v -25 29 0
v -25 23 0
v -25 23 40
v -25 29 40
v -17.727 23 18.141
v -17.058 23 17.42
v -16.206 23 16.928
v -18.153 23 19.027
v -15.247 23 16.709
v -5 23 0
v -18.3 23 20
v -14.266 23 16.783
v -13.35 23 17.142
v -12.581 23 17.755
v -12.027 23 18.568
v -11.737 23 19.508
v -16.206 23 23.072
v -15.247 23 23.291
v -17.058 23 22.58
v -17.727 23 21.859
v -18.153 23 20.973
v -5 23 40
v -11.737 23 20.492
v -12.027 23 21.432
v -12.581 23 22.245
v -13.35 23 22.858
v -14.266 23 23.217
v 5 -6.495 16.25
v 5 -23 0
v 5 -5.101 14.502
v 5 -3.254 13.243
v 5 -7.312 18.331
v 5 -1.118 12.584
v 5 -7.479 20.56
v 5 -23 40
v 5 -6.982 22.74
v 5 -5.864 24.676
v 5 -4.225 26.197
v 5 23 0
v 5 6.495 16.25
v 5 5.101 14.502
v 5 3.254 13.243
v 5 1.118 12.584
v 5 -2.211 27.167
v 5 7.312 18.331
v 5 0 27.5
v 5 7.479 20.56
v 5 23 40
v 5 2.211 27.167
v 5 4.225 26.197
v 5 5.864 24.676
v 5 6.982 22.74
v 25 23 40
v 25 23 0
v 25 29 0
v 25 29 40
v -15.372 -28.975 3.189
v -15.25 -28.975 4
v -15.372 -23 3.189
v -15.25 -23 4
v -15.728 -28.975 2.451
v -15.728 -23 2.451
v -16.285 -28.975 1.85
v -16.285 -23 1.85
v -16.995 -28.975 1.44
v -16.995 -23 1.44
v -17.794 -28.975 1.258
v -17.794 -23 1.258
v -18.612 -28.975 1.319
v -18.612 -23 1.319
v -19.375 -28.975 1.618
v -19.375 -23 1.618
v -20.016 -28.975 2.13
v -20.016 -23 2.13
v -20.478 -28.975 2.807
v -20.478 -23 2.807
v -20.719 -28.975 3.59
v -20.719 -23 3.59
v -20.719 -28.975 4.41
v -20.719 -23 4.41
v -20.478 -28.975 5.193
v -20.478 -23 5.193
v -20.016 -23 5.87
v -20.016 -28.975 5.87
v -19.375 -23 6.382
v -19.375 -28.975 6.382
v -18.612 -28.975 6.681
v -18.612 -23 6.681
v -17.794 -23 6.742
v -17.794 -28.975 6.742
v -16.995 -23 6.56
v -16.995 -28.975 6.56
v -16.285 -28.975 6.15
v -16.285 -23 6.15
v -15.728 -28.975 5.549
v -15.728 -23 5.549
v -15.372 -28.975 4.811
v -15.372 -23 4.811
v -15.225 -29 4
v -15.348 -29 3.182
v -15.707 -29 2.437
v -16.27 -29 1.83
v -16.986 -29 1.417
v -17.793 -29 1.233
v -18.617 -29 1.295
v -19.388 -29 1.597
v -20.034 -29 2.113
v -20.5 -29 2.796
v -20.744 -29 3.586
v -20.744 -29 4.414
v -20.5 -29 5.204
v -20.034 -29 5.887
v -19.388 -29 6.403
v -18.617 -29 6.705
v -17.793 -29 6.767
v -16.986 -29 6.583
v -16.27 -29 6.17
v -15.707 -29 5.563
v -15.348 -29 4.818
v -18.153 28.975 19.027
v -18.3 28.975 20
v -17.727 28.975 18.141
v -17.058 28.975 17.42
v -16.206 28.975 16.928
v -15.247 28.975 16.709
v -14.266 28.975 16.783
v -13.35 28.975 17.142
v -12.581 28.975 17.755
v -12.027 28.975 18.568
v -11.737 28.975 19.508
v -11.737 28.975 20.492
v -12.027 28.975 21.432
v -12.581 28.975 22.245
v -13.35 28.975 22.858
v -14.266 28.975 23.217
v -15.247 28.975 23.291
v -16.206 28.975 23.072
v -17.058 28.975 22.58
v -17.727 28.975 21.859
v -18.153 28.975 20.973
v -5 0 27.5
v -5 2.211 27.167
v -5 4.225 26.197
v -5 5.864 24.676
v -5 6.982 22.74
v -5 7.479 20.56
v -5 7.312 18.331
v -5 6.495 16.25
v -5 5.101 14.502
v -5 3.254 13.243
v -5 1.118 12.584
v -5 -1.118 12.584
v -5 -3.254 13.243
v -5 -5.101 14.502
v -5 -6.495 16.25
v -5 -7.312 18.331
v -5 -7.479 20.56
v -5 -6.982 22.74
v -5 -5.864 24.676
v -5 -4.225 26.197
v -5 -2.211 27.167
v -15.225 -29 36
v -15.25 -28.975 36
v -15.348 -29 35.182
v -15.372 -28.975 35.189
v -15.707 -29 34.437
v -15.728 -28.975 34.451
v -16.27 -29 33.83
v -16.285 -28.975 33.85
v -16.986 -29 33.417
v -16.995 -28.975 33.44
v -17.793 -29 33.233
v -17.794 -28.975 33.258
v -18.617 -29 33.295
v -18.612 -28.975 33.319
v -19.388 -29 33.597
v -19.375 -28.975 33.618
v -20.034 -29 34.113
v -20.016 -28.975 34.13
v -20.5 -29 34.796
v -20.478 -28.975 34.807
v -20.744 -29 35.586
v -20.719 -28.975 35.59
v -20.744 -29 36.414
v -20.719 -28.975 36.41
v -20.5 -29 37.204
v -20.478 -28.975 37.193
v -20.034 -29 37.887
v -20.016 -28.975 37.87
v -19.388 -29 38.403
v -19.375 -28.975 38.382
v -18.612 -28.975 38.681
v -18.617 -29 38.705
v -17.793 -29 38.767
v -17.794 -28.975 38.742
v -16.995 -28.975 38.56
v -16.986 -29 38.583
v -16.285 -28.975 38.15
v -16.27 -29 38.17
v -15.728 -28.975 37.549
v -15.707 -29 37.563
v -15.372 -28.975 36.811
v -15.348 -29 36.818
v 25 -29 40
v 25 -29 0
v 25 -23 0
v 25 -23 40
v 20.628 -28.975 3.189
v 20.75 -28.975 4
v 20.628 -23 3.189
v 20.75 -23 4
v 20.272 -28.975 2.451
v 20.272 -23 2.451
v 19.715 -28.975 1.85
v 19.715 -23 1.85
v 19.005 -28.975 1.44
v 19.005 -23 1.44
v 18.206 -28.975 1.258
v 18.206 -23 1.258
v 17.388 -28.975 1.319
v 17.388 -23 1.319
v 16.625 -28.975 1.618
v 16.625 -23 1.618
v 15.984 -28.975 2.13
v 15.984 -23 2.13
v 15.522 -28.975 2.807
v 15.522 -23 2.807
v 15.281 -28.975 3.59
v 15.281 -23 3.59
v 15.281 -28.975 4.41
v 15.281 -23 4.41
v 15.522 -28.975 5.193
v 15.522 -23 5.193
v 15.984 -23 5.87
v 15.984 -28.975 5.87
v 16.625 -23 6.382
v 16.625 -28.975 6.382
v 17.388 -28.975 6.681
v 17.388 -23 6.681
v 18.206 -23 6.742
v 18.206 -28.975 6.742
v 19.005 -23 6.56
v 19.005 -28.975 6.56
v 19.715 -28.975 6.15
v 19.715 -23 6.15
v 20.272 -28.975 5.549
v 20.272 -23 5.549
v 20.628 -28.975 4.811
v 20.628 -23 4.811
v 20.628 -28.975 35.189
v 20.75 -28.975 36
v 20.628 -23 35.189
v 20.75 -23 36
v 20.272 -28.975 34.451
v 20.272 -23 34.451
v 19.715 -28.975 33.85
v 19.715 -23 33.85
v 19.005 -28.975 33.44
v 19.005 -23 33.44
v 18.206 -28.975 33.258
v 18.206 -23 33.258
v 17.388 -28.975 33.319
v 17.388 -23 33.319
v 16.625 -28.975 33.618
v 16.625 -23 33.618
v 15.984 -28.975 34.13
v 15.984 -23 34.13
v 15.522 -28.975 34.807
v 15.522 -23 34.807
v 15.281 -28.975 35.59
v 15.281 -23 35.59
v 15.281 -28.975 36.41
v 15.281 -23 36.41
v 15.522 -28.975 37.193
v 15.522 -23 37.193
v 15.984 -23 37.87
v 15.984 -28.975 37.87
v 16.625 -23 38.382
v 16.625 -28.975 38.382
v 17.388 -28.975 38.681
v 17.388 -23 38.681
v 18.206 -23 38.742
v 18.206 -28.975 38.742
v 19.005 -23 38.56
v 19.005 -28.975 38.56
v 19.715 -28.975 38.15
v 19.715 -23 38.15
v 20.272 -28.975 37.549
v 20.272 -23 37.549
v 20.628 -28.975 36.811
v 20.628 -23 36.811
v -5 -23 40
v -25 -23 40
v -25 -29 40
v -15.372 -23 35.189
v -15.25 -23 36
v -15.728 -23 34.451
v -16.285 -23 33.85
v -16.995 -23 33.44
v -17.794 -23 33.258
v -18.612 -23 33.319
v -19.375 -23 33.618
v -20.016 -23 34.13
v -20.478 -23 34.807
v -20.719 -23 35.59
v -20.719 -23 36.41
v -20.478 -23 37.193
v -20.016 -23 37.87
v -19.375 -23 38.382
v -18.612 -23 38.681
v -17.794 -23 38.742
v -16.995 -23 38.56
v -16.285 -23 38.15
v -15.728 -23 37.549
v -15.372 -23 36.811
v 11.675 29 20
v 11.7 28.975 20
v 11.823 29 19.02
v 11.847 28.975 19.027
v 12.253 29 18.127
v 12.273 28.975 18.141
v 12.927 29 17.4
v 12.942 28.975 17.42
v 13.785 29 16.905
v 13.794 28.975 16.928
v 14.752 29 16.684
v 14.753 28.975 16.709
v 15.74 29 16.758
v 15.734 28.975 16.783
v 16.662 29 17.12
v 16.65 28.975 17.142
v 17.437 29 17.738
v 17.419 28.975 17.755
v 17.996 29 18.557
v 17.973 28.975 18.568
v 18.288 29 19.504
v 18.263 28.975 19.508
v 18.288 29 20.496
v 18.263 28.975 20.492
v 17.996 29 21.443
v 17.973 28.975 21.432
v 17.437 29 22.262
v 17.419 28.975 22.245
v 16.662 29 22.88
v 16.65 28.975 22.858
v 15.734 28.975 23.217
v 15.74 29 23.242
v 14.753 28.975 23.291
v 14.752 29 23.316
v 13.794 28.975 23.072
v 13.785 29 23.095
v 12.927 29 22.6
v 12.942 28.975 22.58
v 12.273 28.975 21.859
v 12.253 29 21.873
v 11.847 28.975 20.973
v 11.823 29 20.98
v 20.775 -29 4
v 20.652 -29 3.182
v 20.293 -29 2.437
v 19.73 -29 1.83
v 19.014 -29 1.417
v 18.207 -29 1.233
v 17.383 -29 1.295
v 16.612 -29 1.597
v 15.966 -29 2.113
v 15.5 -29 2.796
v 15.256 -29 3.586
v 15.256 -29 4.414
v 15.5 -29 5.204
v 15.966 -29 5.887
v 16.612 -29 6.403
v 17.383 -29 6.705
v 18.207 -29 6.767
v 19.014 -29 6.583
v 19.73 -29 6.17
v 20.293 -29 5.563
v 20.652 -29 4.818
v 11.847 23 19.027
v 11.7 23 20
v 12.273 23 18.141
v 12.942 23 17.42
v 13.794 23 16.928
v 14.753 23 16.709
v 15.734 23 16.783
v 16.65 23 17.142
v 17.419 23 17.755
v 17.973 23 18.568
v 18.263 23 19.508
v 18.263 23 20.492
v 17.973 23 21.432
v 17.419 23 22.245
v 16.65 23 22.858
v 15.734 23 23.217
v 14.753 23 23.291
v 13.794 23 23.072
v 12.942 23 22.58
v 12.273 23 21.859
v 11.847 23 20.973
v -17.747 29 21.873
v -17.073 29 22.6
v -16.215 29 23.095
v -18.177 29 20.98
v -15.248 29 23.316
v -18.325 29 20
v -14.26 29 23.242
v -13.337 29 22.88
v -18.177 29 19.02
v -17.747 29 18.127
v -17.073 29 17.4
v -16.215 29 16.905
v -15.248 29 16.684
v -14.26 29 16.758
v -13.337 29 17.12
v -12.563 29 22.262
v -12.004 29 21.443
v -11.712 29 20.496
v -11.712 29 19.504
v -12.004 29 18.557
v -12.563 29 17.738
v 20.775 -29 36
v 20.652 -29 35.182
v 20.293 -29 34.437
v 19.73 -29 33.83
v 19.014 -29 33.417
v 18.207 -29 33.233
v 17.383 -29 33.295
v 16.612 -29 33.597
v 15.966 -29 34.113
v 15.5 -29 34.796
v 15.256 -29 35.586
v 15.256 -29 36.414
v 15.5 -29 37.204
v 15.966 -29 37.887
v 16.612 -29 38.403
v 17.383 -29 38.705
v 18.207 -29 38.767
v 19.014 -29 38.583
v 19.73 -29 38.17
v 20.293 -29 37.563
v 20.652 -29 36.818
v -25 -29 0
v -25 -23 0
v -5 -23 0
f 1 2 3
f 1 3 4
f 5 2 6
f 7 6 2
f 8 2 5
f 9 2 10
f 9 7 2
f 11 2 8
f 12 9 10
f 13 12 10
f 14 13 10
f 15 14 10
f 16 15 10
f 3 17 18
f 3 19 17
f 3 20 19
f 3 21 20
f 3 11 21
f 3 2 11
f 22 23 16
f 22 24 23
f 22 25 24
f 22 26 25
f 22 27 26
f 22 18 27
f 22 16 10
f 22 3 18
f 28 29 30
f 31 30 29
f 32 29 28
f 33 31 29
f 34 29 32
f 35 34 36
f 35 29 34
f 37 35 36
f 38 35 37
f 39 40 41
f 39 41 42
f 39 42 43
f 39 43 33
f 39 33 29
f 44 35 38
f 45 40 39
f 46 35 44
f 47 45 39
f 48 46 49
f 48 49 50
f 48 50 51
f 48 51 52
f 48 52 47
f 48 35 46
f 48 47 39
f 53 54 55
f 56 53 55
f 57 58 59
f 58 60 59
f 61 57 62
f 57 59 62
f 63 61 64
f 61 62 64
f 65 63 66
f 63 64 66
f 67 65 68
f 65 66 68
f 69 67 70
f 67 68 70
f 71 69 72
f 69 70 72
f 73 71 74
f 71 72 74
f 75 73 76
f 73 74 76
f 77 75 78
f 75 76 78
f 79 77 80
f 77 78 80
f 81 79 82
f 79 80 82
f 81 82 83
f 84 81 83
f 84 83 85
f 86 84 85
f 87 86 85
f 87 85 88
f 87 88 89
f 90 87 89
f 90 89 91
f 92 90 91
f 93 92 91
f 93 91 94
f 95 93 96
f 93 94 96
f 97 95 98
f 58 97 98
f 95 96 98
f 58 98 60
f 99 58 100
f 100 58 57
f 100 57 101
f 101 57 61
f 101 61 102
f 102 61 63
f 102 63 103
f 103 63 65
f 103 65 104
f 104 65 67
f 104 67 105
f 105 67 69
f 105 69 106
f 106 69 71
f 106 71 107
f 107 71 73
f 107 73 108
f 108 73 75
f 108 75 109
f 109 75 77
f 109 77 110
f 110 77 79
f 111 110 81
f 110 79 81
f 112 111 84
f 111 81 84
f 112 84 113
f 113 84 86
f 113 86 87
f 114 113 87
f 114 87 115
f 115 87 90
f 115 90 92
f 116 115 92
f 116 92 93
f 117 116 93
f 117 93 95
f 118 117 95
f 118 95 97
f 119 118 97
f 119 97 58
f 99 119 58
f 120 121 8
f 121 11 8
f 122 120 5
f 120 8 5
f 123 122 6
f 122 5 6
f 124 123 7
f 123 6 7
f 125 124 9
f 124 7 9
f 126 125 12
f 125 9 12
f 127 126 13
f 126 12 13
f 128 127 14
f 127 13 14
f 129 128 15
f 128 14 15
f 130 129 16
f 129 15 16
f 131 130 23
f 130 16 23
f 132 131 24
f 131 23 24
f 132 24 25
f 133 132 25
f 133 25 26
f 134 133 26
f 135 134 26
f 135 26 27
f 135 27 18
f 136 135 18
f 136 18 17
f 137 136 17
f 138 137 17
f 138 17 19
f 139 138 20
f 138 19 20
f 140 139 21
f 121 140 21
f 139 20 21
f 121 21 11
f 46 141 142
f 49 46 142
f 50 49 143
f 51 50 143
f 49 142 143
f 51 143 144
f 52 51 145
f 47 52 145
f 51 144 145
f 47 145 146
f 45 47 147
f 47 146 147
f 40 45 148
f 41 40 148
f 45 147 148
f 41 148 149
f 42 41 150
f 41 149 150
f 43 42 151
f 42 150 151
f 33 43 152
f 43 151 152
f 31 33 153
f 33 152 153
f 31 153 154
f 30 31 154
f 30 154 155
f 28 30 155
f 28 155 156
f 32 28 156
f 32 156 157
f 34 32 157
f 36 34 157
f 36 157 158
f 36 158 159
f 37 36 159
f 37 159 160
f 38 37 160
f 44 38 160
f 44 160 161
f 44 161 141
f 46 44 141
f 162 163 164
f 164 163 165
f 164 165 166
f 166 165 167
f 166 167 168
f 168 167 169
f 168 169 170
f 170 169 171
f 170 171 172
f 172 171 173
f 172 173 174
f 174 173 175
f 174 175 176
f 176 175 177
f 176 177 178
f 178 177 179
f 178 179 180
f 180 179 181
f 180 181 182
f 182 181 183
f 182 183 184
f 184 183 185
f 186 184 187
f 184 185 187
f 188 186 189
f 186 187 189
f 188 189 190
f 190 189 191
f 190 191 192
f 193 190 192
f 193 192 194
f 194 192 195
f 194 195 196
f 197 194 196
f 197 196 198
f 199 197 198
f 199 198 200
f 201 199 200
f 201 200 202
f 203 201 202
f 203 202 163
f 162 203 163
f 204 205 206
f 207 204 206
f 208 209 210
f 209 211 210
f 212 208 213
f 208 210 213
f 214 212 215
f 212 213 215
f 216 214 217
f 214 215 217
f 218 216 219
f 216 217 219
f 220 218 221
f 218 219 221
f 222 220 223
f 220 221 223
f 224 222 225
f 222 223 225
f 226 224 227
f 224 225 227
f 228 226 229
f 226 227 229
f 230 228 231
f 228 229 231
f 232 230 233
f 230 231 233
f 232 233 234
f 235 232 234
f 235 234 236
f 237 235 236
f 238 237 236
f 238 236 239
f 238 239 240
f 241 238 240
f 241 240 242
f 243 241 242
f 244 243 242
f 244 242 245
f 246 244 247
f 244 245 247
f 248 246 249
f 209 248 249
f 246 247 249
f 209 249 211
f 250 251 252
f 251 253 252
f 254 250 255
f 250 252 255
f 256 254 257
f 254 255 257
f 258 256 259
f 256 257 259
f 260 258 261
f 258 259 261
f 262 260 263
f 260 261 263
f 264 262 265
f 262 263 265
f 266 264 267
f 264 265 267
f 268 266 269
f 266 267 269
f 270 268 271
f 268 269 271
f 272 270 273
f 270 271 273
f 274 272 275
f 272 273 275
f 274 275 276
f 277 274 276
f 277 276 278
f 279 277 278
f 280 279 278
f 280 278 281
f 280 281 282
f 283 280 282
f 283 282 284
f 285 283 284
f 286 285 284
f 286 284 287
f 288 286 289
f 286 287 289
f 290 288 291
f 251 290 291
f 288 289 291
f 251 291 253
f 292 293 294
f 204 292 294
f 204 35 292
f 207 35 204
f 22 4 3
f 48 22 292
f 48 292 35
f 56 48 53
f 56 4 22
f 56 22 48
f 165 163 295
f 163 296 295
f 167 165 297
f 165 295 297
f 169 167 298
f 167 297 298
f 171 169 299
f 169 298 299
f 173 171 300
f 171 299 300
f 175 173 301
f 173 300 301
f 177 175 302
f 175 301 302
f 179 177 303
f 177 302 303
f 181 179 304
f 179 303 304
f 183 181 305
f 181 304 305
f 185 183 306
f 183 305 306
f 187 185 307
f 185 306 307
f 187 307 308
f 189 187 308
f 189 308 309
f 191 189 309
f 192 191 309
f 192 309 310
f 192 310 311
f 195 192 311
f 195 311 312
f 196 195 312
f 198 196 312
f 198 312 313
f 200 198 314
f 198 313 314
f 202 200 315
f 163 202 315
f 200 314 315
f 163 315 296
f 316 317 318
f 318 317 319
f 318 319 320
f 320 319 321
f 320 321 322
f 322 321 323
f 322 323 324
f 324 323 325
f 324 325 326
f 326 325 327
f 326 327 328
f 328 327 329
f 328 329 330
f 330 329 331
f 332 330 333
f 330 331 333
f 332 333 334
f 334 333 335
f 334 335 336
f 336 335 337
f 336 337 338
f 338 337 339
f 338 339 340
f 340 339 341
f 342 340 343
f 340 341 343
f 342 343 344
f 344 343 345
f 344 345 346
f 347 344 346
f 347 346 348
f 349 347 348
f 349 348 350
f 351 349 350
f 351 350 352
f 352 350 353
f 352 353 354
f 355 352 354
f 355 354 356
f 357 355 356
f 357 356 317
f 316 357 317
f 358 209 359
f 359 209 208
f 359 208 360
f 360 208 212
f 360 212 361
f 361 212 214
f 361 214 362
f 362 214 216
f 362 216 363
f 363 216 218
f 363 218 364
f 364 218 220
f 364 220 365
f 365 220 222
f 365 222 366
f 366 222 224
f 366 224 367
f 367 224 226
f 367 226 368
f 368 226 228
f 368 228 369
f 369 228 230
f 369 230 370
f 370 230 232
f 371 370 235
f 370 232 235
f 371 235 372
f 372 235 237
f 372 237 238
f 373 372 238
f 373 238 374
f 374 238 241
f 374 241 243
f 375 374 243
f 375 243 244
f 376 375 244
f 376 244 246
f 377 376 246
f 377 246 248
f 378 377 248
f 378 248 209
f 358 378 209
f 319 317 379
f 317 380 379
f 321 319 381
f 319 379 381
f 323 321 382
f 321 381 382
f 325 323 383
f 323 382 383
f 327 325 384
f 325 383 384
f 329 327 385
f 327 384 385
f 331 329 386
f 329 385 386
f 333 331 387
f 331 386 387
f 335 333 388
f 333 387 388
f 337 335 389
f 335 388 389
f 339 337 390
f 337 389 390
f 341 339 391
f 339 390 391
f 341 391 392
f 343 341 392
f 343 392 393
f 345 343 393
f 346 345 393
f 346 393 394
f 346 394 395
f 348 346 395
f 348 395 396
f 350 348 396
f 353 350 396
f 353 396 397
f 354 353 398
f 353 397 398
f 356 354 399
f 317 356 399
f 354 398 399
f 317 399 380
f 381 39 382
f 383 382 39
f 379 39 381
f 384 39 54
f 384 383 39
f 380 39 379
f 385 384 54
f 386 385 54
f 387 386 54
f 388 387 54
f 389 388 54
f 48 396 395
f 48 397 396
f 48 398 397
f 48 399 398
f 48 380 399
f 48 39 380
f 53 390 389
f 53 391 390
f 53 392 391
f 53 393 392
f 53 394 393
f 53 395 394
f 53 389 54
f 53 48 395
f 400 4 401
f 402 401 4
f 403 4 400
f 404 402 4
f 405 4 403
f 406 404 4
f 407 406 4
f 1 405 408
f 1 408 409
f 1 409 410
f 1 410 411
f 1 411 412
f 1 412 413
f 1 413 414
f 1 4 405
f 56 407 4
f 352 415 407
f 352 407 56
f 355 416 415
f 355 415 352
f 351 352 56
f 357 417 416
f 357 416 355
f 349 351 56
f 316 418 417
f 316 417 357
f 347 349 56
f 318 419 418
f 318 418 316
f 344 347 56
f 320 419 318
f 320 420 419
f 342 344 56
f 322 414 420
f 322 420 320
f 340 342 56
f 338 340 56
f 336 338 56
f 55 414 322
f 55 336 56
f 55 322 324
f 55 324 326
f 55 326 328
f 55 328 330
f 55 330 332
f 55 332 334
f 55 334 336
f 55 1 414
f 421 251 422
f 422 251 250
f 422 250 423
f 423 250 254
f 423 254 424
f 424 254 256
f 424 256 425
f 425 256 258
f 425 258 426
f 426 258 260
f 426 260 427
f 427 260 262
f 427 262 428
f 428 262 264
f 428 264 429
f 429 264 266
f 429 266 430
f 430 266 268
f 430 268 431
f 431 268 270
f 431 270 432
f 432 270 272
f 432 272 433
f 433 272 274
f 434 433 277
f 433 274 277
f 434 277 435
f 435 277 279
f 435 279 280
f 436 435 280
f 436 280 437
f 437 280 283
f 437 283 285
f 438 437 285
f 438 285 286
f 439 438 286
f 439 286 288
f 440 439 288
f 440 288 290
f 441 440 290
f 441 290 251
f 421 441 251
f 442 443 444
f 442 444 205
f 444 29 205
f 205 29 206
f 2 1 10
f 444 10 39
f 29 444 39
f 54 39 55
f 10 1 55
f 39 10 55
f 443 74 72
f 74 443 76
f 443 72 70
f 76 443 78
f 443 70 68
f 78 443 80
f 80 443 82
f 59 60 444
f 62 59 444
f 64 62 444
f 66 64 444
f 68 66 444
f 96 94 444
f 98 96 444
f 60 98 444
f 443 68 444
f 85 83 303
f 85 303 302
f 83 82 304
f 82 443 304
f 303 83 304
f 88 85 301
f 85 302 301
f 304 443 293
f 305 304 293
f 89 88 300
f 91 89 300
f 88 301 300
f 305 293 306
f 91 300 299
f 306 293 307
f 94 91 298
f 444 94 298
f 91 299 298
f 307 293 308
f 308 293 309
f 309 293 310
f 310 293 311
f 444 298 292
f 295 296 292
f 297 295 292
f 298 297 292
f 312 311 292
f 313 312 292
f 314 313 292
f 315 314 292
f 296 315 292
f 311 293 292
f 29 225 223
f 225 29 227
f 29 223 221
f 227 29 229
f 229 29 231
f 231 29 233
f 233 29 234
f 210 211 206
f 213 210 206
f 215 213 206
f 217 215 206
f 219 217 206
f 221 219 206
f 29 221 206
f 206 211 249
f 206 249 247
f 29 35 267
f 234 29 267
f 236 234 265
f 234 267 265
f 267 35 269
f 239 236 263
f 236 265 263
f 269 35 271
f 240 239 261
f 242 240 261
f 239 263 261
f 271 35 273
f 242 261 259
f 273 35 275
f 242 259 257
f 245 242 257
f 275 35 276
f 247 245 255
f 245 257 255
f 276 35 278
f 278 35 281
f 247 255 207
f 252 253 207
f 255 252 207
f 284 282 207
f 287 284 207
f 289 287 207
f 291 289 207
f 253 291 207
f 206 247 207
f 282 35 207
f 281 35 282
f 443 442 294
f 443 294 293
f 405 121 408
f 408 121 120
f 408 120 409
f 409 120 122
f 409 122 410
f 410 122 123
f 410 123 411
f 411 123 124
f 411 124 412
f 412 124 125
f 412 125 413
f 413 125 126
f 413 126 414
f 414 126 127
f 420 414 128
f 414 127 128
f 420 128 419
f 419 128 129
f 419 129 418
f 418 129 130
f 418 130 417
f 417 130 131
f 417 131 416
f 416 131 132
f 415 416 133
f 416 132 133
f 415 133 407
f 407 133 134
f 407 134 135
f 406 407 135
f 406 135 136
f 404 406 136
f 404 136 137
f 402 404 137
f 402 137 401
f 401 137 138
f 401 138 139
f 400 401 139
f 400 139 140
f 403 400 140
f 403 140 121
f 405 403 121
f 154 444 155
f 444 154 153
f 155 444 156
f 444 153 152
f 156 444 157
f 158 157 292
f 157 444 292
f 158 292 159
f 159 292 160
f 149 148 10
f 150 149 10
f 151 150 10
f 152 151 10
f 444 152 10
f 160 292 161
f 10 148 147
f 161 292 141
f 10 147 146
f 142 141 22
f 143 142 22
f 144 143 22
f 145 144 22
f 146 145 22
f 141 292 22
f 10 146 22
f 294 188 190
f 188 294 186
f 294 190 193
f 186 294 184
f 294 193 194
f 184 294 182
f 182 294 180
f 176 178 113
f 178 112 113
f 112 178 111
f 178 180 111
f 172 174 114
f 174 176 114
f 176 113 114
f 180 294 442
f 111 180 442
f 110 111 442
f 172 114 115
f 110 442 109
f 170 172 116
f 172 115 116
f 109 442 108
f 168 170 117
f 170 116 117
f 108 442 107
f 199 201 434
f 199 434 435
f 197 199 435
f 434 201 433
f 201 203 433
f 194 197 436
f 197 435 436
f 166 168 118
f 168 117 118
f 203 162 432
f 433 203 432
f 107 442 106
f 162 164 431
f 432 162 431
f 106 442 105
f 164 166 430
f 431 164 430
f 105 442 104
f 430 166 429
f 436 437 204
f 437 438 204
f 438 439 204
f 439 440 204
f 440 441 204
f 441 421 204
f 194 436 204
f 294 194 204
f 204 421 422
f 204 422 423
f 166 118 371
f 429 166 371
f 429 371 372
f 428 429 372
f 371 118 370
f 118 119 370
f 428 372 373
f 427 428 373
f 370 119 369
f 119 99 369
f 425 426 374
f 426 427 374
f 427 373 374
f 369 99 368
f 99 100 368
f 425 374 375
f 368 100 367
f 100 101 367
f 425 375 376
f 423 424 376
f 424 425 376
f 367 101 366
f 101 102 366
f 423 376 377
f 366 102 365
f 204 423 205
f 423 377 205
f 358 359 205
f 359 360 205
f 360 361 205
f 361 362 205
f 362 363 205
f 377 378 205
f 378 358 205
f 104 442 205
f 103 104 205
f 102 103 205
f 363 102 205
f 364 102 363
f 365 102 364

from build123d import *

# Parameters (mm, degrees)
SKETCH_1_W                   = 50
SKETCH_1_H                   = 58
EXTRUDE_1_DEPTH              = 40
SKETCH_2_W                   = 32.792818714
SKETCH_2_H                   = 46
CUT_EXTRUDE_1_DEPTH          = 60
SKETCH_3_R                   = 7.5
CUT_EXTRUDE_2_DEPTH          = 35
HOLE_WIZARD_M5_1_D           = 5.5
HOLE_WIZARD_M5_1_DEPTH       = 17
HOLE_WIZARD_M5_1_CSINK_D     = 5.55
HOLE_WIZARD_M5_1_CSINK_ANGLE = 90
HOLE_WIZARD_M5_1_TIP         = 1.652366702
HOLE_WIZARD_M6_1_D           = 6.6
HOLE_WIZARD_M6_1_DEPTH       = 17
HOLE_WIZARD_M6_1_CSINK_D     = 6.65
HOLE_WIZARD_M6_1_CSINK_ANGLE = 90
HOLE_WIZARD_M6_1_TIP         = 1.982840043


with BuildPart() as part:
    # 草图1 → 凸台-拉伸1 (new body)
    with BuildSketch(Plane.XY):
        Rectangle(SKETCH_1_W, SKETCH_1_H)
    extrude(amount=EXTRUDE_1_DEPTH)

    # 草图2 → 切除-拉伸1 (cut)
    with BuildSketch(Plane.XY.offset(40)):
        with Locations((-21.396409357, 0)):
            Rectangle(SKETCH_2_W, SKETCH_2_H)
        with Locations((21.396409357, 0)):
            Rectangle(SKETCH_2_W, SKETCH_2_H)
    extrude(amount=-CUT_EXTRUDE_1_DEPTH, mode=Mode.SUBTRACT)

    # 草图3 → 切除-拉伸2 (cut)
    with BuildSketch(Plane.ZY.offset(5)):
        with Locations((20, 0)):
            Circle(SKETCH_3_R)
    extrude(amount=-CUT_EXTRUDE_2_DEPTH, mode=Mode.SUBTRACT)

    # M5 间隙槽口1
    with Locations(Plane(origin=(0, -29, 0), x_dir=(-1, 0, 0), z_dir=(0, -1, 0))):
        with Locations((-18, -4), (18, -4), (18, -36), (-18, -36)):
            CounterSinkHole(HOLE_WIZARD_M5_1_D / 2, HOLE_WIZARD_M5_1_CSINK_D / 2, depth=HOLE_WIZARD_M5_1_DEPTH, counter_sink_angle=HOLE_WIZARD_M5_1_CSINK_ANGLE)
            with Locations((0, 0, -(HOLE_WIZARD_M5_1_DEPTH + HOLE_WIZARD_M5_1_TIP / 2))):  # 118° drill point
                Cone(0, HOLE_WIZARD_M5_1_D / 2, HOLE_WIZARD_M5_1_TIP, mode=Mode.SUBTRACT)

    # M6 间隙槽口1
    with Locations(Plane(origin=(0, 29, 0), x_dir=(1, 0, 0), z_dir=(0, 1, 0))):
        with Locations((-15, -20), (15, -20)):
            CounterSinkHole(HOLE_WIZARD_M6_1_D / 2, HOLE_WIZARD_M6_1_CSINK_D / 2, depth=HOLE_WIZARD_M6_1_DEPTH, counter_sink_angle=HOLE_WIZARD_M6_1_CSINK_ANGLE)
            with Locations((0, 0, -(HOLE_WIZARD_M6_1_DEPTH + HOLE_WIZARD_M6_1_TIP / 2))):  # 118° drill point
                Cone(0, HOLE_WIZARD_M6_1_D / 2, HOLE_WIZARD_M6_1_TIP, mode=Mode.SUBTRACT)


solid = part.part
